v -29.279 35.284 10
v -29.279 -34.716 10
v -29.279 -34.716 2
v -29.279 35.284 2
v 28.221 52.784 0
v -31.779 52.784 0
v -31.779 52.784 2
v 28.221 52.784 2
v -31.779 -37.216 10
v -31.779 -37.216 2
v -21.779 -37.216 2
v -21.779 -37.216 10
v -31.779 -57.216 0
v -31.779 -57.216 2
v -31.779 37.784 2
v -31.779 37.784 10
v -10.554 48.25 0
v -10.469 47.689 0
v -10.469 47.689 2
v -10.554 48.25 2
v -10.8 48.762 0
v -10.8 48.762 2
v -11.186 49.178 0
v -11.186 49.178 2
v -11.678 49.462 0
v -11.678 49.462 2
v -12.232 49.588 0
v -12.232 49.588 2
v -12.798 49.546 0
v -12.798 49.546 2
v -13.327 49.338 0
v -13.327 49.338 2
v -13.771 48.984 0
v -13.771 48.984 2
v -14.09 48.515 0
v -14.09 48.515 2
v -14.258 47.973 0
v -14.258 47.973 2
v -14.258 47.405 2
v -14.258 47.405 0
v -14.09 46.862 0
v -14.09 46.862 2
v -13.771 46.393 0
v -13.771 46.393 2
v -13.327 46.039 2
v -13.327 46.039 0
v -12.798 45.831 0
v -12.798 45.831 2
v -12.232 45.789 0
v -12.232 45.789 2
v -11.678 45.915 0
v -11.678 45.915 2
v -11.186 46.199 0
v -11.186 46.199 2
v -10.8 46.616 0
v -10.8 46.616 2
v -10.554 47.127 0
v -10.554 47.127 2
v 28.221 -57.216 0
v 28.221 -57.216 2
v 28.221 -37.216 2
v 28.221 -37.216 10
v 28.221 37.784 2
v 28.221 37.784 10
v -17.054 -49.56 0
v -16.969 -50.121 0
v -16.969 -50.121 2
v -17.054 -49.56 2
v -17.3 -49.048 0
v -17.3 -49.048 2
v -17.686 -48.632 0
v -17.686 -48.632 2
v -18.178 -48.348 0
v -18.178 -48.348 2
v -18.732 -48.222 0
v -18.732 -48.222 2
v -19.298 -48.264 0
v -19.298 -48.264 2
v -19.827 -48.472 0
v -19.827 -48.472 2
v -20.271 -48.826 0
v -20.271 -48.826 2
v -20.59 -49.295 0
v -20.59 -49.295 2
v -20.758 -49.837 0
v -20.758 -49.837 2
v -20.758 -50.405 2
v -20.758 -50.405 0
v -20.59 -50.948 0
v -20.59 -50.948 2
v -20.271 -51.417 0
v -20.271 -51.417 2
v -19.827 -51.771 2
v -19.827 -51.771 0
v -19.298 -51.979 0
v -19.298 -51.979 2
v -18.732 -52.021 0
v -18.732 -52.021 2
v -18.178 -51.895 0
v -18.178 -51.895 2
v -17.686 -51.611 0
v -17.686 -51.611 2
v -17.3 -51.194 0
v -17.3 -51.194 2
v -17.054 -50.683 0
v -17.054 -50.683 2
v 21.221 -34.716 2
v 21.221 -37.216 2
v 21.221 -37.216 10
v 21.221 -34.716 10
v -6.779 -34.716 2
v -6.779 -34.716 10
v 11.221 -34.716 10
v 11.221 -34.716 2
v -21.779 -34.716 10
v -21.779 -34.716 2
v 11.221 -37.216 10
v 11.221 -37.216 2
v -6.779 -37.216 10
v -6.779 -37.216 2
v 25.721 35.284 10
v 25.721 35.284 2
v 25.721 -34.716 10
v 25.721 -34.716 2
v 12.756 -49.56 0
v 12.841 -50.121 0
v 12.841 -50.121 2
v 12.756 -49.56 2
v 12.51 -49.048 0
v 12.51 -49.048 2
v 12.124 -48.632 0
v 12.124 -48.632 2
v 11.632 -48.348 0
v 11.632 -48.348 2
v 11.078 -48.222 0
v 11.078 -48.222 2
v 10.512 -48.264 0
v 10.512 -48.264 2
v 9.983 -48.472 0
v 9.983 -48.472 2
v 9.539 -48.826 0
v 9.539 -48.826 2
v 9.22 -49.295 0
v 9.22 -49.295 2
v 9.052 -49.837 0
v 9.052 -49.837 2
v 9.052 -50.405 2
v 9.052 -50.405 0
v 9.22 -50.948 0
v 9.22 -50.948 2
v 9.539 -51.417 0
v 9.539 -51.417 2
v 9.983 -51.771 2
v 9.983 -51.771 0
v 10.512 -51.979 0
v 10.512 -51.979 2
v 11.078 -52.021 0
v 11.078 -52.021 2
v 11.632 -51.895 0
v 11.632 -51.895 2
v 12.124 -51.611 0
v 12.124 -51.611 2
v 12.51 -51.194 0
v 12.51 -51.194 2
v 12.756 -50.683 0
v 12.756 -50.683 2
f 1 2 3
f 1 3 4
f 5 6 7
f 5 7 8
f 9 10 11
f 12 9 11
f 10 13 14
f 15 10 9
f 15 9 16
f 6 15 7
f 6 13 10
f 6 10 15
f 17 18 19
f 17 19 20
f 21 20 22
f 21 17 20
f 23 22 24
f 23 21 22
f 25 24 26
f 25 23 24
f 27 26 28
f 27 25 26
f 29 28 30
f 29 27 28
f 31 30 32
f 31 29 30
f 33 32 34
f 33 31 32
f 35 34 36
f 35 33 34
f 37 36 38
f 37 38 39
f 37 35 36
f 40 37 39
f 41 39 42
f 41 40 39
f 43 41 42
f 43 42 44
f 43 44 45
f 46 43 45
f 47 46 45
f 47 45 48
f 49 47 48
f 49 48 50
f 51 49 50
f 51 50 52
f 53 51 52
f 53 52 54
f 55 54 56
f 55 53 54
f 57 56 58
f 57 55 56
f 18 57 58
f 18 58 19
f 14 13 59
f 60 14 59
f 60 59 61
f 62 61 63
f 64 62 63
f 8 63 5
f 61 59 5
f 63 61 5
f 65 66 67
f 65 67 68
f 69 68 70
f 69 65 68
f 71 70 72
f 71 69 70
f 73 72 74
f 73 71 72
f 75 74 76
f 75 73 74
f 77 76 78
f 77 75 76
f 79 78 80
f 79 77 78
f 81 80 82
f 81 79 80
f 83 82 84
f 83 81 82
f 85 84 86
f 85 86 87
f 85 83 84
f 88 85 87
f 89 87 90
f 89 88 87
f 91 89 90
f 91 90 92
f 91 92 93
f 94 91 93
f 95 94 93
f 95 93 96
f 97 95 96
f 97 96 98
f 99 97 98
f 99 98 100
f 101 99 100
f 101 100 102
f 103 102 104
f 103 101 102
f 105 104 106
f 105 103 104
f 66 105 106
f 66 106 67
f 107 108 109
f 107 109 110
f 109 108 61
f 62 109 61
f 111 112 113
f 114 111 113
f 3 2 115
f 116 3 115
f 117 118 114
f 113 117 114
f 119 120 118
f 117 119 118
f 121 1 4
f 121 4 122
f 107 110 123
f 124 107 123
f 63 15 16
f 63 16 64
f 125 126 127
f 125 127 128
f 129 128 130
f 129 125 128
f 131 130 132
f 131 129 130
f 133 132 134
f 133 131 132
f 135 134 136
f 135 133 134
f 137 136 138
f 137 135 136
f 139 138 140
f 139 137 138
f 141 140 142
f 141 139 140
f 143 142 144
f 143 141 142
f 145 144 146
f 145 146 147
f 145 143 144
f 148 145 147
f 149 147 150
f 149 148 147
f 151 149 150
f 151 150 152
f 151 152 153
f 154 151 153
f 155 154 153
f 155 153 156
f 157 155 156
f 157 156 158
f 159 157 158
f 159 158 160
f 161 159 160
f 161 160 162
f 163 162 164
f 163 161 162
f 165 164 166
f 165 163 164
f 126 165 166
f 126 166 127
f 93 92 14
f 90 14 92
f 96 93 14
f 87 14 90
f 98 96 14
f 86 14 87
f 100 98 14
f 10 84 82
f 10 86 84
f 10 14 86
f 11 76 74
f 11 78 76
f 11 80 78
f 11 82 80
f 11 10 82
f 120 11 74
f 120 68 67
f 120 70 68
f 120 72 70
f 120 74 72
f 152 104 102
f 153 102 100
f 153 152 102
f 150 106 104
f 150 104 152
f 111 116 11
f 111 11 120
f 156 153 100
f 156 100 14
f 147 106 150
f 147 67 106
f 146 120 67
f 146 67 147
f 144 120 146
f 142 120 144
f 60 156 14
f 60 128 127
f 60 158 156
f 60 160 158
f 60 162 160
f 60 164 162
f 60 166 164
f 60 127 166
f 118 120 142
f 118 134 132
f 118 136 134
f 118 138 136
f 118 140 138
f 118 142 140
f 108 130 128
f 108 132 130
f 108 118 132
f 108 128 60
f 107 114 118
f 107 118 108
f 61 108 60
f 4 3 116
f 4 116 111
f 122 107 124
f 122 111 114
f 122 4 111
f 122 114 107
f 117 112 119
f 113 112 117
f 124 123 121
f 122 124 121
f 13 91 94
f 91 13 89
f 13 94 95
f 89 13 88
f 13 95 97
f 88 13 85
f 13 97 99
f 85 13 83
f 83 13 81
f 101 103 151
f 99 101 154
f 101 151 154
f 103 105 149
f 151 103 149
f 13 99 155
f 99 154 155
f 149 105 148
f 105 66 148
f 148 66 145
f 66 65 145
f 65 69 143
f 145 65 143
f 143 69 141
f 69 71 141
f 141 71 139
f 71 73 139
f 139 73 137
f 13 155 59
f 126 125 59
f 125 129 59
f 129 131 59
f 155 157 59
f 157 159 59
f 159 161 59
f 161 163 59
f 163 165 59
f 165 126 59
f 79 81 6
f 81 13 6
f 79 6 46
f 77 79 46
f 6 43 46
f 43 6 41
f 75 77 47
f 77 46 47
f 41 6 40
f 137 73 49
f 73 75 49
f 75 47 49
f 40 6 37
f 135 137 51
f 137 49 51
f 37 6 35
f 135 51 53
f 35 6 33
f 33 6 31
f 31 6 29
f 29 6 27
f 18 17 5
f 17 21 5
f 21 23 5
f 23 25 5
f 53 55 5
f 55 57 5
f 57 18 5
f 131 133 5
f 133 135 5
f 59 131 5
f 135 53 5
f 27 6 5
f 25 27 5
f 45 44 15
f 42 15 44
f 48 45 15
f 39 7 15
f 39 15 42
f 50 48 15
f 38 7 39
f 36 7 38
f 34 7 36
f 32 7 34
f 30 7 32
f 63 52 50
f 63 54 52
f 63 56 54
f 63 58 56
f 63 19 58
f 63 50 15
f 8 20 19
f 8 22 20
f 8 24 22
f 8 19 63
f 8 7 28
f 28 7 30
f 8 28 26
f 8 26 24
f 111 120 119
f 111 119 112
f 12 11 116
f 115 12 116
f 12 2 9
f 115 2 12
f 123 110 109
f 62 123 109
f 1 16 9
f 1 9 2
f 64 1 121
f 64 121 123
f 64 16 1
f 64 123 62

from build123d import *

# Parameters (mm, degrees)
F0_W     = 60
F0_H     = 75
F1_DEPTH = 10
F2_W     = 55
F2_H     = 70
F3_DEPTH = 8
F4_W     = 15
F4_H     = 3.129633
F4_W_2   = 10
F5_DEPTH = 8
F6_W     = 60
F6_H     = 20
F6_R     = 1.905
F7_DEPTH = 2
F8_W     = 60
F8_H     = 15
F8_R     = 1.905
F9_DEPTH = 2


with BuildPart() as f1:
    # F0 (on Top) → F1 (new body)
    with BuildSketch(Plane.XY):
        with Locations((-1.779088, 0.283666)):
            Rectangle(F0_W, F0_H)
    extrude(amount=F1_DEPTH)

    # F2 (on face) → F3 (cut)
    with BuildSketch(Plane.XY.offset(10)):
        with Locations((-1.779088, 0.283666)):
            Rectangle(F2_W, F2_H)
    extrude(amount=-F3_DEPTH, mode=Mode.SUBTRACT)

    # F4 (on face) → F5 (cut)
    with BuildSketch(Plane.XY.offset(2)):
        with Locations((-14.279088, -36.044677)):
            Rectangle(F4_W, F4_H)
        with Locations((16.220912, -36.044677)):
            Rectangle(F4_W_2, F4_H)
    extrude(amount=F5_DEPTH, mode=Mode.SUBTRACT)

    # F6 (on Top) → F7 (join)
    with BuildSketch(Plane.XY):
        with Locations((-1.779088, -47.216334)):
            Rectangle(F6_W, F6_H)
        with Locations((-18.874088, -50.121334)):
            Circle(F6_R, mode=Mode.SUBTRACT)
        with Locations((10.935912, -50.121334)):
            Circle(F6_R, mode=Mode.SUBTRACT)
    extrude(amount=F7_DEPTH)

    # F8 (on Top) → F9 (join)
    with BuildSketch(Plane.XY):
        with Locations((-1.779088, 45.283666)):
            Rectangle(F8_W, F8_H)
        with Locations((-12.374088, 47.688666)):
            Circle(F8_R, mode=Mode.SUBTRACT)
    extrude(amount=F9_DEPTH)


solid = f1.part
